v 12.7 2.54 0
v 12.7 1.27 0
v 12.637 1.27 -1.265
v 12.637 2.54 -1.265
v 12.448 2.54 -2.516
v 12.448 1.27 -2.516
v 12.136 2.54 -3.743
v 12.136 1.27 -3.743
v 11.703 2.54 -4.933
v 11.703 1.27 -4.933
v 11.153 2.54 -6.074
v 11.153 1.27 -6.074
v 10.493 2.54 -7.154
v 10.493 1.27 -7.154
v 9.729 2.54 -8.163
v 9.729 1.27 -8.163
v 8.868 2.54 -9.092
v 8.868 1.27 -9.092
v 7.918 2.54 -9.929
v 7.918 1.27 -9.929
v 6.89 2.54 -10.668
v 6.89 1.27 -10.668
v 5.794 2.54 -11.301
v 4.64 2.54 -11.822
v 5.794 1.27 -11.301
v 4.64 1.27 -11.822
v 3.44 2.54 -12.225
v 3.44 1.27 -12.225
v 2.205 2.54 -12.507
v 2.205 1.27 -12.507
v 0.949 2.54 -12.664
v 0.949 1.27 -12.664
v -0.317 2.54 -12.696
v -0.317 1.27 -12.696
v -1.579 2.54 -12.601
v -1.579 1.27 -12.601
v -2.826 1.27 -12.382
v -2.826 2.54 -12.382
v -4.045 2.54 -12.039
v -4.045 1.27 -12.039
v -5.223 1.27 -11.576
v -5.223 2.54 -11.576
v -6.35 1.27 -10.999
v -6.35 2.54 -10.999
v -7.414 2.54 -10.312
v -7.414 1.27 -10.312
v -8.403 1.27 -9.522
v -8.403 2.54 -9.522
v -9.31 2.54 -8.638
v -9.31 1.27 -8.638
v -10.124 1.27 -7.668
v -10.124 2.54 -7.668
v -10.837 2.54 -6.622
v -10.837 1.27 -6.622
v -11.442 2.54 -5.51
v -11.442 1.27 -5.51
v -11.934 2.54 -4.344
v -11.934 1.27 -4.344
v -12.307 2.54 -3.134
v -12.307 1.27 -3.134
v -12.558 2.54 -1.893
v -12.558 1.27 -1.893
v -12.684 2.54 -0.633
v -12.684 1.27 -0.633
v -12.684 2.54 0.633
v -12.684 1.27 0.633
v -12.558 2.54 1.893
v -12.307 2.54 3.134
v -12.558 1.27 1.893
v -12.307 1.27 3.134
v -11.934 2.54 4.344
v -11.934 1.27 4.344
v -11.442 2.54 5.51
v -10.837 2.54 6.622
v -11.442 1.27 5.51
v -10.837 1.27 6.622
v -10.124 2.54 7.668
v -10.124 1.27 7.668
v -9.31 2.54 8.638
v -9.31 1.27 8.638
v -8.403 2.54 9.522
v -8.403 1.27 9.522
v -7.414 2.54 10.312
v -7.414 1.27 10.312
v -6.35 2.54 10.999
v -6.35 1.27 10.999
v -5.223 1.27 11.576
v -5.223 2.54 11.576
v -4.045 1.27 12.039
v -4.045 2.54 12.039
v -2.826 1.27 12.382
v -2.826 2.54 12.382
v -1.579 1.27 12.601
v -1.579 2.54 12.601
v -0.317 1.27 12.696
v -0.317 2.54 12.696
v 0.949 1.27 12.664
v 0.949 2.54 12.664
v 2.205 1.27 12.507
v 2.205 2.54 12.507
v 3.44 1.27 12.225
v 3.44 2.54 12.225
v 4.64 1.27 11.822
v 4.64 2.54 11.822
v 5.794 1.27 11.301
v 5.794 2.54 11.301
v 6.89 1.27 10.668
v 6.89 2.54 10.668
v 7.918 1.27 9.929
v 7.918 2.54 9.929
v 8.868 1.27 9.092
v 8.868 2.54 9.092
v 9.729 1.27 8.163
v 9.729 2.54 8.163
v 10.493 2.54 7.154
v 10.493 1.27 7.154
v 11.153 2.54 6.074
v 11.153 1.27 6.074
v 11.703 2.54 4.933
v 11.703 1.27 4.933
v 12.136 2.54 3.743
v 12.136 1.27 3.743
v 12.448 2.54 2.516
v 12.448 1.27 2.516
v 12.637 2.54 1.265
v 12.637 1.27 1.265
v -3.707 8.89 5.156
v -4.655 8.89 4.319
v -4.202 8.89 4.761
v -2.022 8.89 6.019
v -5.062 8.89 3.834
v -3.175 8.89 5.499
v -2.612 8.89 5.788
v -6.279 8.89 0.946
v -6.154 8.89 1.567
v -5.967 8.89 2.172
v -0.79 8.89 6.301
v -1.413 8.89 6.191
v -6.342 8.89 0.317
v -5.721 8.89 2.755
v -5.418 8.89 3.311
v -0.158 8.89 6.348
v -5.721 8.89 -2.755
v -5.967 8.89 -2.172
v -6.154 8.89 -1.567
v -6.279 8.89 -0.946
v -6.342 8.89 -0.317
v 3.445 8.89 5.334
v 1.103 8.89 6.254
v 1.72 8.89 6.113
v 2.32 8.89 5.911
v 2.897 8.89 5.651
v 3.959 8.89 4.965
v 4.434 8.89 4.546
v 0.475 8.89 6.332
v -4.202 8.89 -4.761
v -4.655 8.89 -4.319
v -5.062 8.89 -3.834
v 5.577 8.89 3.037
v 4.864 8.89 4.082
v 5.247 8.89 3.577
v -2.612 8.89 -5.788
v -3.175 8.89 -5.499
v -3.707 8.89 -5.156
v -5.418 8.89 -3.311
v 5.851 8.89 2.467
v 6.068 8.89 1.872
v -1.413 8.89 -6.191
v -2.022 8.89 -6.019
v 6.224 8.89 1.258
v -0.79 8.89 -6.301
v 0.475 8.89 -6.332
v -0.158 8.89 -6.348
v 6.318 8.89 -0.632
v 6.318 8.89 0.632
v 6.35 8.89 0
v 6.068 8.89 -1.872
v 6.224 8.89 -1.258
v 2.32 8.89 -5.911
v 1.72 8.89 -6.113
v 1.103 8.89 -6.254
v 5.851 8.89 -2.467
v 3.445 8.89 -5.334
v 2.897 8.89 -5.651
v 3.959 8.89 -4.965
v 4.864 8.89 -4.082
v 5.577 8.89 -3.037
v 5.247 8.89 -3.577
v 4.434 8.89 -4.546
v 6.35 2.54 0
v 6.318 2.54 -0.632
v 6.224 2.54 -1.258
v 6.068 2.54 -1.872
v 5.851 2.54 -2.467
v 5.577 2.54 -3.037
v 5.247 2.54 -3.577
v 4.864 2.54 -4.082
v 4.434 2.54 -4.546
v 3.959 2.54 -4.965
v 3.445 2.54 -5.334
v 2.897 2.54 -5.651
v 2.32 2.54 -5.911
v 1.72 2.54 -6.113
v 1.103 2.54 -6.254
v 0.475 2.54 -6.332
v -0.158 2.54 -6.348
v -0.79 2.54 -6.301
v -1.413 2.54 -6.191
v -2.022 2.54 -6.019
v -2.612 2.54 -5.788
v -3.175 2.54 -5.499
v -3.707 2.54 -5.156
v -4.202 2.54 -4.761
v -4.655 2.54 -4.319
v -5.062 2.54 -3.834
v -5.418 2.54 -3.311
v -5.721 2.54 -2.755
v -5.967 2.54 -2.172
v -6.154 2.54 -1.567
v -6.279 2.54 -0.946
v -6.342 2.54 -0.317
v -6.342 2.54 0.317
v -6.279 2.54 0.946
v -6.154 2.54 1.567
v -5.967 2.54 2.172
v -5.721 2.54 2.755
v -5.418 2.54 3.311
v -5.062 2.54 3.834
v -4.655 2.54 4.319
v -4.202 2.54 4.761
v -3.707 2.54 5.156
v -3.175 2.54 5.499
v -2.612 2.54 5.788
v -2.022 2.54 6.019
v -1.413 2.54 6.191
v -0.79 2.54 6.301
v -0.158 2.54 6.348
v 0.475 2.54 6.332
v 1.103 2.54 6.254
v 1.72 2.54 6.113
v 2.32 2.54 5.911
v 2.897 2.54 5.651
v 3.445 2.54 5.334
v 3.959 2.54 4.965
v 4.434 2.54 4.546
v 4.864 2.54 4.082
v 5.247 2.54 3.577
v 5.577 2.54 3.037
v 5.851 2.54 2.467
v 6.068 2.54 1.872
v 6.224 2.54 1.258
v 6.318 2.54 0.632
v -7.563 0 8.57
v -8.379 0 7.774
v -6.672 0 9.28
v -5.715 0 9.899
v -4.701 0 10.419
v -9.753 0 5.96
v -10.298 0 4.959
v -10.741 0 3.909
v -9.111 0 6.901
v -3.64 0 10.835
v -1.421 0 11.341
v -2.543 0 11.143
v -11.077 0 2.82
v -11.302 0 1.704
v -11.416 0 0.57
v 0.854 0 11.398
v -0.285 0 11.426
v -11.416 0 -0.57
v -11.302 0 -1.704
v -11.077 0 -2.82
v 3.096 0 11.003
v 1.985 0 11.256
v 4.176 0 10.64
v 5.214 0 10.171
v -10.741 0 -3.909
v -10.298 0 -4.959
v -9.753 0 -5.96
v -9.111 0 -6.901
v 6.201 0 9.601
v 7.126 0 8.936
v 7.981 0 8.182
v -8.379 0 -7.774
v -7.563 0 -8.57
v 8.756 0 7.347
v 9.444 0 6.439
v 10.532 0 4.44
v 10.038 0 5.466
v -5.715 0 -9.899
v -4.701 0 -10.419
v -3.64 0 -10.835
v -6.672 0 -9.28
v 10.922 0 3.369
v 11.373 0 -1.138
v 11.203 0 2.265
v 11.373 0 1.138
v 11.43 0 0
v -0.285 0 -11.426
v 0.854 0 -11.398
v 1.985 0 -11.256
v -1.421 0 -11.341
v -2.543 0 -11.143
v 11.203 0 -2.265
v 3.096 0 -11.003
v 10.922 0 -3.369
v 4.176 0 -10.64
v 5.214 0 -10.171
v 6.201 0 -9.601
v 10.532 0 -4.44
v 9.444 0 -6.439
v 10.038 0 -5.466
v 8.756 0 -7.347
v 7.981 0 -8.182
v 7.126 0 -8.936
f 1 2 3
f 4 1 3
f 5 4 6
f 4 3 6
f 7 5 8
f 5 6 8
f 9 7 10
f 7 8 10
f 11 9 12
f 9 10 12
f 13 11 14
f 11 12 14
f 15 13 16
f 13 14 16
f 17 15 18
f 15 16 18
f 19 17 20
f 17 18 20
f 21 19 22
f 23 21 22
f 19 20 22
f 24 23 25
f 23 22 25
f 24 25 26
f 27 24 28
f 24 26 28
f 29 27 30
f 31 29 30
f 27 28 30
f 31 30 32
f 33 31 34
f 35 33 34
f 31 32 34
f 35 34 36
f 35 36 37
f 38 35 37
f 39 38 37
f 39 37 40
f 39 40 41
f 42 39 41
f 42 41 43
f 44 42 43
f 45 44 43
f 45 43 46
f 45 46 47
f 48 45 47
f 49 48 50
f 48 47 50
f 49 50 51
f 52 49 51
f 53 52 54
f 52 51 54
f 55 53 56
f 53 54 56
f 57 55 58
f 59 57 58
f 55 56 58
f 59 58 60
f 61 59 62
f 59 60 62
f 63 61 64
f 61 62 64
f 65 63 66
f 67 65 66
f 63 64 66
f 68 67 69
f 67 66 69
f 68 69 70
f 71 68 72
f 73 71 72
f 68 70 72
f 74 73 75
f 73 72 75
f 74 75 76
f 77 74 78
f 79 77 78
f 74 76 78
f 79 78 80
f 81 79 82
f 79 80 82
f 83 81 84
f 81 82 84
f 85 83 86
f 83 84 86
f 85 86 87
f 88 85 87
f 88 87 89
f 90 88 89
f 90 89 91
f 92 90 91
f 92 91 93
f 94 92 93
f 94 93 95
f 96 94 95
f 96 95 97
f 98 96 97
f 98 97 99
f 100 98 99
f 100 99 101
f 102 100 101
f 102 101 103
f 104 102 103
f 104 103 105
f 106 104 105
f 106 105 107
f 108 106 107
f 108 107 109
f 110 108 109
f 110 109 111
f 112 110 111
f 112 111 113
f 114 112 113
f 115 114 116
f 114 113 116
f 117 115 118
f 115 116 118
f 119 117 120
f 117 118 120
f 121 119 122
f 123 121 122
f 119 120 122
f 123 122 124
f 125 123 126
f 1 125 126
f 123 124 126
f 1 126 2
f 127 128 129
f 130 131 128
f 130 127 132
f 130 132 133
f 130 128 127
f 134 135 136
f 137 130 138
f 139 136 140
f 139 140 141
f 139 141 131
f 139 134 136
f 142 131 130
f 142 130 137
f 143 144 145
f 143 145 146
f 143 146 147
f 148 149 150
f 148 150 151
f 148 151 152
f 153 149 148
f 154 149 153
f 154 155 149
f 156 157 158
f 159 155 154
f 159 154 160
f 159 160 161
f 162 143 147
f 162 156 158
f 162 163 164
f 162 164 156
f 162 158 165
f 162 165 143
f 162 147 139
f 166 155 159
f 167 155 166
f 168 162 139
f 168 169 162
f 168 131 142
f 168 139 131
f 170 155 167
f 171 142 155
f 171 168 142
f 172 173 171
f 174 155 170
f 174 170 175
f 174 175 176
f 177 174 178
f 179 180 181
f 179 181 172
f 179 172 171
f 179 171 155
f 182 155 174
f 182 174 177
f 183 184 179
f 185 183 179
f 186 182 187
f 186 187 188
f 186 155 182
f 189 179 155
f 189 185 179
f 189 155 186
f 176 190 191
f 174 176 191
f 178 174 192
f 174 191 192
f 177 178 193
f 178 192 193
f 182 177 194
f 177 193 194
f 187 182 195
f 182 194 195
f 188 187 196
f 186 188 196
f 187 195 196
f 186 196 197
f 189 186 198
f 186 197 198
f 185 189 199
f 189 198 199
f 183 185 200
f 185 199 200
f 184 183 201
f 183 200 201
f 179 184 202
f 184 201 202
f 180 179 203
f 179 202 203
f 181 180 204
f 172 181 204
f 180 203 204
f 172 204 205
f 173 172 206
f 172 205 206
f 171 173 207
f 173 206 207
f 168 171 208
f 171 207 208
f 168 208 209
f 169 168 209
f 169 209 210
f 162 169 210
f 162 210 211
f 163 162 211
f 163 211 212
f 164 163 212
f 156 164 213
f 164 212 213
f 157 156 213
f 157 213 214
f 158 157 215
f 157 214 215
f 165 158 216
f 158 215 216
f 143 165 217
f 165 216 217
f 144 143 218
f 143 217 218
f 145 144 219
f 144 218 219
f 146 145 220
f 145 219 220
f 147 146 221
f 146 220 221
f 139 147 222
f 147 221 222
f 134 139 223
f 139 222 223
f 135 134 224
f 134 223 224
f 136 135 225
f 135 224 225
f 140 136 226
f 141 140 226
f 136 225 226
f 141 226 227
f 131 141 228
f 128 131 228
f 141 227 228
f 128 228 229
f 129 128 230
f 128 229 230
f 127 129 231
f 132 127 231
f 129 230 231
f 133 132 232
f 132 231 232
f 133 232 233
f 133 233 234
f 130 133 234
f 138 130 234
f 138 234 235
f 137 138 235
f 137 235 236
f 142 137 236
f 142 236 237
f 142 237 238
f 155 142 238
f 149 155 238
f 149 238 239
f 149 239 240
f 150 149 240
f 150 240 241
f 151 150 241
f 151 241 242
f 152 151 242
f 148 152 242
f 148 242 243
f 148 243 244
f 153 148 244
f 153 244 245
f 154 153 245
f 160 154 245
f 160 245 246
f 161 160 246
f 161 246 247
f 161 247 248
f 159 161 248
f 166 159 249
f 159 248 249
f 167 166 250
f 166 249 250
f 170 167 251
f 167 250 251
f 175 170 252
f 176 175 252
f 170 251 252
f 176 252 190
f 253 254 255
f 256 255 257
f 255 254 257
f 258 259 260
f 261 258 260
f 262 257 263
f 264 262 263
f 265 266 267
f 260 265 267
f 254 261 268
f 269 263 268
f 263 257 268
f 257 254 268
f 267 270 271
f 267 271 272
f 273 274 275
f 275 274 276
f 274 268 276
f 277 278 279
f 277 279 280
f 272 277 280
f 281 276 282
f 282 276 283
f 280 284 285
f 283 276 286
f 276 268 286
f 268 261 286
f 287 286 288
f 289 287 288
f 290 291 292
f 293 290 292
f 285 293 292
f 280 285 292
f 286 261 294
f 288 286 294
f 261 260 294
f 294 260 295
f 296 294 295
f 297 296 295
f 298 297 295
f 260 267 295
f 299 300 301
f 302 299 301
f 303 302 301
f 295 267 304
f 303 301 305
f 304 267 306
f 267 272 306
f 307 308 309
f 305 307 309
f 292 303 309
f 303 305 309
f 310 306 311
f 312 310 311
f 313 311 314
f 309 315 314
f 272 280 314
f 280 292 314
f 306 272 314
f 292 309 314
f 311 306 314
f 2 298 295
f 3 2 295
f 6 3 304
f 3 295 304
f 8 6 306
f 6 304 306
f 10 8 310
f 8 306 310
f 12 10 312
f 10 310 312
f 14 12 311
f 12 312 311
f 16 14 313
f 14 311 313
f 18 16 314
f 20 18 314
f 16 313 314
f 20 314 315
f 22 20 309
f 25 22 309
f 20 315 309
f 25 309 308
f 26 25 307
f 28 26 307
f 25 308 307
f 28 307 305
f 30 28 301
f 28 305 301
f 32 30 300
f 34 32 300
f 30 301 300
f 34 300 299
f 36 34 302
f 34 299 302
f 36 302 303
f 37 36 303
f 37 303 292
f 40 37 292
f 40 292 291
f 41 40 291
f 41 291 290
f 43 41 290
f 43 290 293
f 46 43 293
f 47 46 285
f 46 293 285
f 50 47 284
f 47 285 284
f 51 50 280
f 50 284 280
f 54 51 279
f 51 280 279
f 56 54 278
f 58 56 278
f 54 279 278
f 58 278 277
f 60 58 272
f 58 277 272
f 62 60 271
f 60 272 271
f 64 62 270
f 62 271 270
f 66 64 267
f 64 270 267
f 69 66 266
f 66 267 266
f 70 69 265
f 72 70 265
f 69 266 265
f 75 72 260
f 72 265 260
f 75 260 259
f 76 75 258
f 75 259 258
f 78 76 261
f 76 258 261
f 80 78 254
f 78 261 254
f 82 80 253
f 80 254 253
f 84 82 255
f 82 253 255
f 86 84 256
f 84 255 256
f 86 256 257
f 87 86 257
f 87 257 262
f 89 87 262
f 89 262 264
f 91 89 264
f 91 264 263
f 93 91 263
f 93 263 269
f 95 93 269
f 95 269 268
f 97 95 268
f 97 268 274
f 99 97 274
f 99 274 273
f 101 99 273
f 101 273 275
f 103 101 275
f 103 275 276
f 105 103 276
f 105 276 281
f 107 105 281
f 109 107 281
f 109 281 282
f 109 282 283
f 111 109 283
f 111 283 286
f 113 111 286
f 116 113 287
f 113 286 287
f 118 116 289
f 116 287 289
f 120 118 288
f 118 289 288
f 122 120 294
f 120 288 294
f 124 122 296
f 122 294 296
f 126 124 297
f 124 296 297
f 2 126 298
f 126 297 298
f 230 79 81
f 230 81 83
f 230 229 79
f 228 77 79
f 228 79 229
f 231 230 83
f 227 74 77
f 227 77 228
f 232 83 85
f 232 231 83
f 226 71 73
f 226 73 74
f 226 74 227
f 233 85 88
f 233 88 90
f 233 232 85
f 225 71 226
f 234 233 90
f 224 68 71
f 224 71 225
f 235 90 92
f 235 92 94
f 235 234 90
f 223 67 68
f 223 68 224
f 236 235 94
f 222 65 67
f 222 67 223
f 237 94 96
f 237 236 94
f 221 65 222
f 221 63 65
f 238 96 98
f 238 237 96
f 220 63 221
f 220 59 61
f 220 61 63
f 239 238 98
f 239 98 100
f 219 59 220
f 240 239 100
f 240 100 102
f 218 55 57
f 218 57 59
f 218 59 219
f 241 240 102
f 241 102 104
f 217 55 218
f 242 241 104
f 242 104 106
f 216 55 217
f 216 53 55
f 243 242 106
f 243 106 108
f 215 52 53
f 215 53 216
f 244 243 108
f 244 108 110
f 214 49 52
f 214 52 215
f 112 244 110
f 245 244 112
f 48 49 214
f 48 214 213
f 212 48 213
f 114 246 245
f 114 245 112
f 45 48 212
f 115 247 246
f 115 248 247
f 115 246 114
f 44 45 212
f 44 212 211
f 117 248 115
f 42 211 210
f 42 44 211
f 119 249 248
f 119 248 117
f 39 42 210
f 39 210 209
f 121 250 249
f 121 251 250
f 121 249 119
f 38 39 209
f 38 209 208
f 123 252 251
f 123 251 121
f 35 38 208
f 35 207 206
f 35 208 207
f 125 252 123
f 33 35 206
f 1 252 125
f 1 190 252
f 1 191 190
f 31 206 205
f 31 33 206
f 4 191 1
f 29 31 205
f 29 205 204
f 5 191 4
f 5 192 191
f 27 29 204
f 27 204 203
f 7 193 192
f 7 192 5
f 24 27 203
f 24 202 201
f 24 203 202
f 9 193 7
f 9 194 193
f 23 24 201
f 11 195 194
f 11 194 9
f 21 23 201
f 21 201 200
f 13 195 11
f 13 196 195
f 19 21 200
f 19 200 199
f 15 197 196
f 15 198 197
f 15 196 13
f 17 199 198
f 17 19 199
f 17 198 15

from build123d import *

# Parameters (mm, degrees)
SKETCH1_R           = 12.7
BOSS_EXTRUDE1_DEPTH = 2.54
SKETCH2_R           = 6.35
BOSS_EXTRUDE2_DEPTH = 6.35
CHAMFER1_SIZE       = 1.27


with BuildPart() as part:
    # Sketch1 → Boss-Extrude1 (new body)
    with BuildSketch(Plane(origin=(0, 0, 0), x_dir=(1, 0, 0), z_dir=(0, 1, 0))):
        Circle(SKETCH1_R)
    extrude(amount=BOSS_EXTRUDE1_DEPTH)

    # Sketch2 → Boss-Extrude2 (add)
    with BuildSketch(Plane(origin=(0, 2.54, 0), x_dir=(1, 0, 0), z_dir=(0, 1, 0))):
        Circle(SKETCH2_R)
    extrude(amount=BOSS_EXTRUDE2_DEPTH)

    # Chamfer1
    chamfer1_edges = [part.edges().sort_by_distance(p)[0] for p in [
        (-12.7, 0, 0),
    ]]
    chamfer(chamfer1_edges, length=CHAMFER1_SIZE)


solid = part.part
